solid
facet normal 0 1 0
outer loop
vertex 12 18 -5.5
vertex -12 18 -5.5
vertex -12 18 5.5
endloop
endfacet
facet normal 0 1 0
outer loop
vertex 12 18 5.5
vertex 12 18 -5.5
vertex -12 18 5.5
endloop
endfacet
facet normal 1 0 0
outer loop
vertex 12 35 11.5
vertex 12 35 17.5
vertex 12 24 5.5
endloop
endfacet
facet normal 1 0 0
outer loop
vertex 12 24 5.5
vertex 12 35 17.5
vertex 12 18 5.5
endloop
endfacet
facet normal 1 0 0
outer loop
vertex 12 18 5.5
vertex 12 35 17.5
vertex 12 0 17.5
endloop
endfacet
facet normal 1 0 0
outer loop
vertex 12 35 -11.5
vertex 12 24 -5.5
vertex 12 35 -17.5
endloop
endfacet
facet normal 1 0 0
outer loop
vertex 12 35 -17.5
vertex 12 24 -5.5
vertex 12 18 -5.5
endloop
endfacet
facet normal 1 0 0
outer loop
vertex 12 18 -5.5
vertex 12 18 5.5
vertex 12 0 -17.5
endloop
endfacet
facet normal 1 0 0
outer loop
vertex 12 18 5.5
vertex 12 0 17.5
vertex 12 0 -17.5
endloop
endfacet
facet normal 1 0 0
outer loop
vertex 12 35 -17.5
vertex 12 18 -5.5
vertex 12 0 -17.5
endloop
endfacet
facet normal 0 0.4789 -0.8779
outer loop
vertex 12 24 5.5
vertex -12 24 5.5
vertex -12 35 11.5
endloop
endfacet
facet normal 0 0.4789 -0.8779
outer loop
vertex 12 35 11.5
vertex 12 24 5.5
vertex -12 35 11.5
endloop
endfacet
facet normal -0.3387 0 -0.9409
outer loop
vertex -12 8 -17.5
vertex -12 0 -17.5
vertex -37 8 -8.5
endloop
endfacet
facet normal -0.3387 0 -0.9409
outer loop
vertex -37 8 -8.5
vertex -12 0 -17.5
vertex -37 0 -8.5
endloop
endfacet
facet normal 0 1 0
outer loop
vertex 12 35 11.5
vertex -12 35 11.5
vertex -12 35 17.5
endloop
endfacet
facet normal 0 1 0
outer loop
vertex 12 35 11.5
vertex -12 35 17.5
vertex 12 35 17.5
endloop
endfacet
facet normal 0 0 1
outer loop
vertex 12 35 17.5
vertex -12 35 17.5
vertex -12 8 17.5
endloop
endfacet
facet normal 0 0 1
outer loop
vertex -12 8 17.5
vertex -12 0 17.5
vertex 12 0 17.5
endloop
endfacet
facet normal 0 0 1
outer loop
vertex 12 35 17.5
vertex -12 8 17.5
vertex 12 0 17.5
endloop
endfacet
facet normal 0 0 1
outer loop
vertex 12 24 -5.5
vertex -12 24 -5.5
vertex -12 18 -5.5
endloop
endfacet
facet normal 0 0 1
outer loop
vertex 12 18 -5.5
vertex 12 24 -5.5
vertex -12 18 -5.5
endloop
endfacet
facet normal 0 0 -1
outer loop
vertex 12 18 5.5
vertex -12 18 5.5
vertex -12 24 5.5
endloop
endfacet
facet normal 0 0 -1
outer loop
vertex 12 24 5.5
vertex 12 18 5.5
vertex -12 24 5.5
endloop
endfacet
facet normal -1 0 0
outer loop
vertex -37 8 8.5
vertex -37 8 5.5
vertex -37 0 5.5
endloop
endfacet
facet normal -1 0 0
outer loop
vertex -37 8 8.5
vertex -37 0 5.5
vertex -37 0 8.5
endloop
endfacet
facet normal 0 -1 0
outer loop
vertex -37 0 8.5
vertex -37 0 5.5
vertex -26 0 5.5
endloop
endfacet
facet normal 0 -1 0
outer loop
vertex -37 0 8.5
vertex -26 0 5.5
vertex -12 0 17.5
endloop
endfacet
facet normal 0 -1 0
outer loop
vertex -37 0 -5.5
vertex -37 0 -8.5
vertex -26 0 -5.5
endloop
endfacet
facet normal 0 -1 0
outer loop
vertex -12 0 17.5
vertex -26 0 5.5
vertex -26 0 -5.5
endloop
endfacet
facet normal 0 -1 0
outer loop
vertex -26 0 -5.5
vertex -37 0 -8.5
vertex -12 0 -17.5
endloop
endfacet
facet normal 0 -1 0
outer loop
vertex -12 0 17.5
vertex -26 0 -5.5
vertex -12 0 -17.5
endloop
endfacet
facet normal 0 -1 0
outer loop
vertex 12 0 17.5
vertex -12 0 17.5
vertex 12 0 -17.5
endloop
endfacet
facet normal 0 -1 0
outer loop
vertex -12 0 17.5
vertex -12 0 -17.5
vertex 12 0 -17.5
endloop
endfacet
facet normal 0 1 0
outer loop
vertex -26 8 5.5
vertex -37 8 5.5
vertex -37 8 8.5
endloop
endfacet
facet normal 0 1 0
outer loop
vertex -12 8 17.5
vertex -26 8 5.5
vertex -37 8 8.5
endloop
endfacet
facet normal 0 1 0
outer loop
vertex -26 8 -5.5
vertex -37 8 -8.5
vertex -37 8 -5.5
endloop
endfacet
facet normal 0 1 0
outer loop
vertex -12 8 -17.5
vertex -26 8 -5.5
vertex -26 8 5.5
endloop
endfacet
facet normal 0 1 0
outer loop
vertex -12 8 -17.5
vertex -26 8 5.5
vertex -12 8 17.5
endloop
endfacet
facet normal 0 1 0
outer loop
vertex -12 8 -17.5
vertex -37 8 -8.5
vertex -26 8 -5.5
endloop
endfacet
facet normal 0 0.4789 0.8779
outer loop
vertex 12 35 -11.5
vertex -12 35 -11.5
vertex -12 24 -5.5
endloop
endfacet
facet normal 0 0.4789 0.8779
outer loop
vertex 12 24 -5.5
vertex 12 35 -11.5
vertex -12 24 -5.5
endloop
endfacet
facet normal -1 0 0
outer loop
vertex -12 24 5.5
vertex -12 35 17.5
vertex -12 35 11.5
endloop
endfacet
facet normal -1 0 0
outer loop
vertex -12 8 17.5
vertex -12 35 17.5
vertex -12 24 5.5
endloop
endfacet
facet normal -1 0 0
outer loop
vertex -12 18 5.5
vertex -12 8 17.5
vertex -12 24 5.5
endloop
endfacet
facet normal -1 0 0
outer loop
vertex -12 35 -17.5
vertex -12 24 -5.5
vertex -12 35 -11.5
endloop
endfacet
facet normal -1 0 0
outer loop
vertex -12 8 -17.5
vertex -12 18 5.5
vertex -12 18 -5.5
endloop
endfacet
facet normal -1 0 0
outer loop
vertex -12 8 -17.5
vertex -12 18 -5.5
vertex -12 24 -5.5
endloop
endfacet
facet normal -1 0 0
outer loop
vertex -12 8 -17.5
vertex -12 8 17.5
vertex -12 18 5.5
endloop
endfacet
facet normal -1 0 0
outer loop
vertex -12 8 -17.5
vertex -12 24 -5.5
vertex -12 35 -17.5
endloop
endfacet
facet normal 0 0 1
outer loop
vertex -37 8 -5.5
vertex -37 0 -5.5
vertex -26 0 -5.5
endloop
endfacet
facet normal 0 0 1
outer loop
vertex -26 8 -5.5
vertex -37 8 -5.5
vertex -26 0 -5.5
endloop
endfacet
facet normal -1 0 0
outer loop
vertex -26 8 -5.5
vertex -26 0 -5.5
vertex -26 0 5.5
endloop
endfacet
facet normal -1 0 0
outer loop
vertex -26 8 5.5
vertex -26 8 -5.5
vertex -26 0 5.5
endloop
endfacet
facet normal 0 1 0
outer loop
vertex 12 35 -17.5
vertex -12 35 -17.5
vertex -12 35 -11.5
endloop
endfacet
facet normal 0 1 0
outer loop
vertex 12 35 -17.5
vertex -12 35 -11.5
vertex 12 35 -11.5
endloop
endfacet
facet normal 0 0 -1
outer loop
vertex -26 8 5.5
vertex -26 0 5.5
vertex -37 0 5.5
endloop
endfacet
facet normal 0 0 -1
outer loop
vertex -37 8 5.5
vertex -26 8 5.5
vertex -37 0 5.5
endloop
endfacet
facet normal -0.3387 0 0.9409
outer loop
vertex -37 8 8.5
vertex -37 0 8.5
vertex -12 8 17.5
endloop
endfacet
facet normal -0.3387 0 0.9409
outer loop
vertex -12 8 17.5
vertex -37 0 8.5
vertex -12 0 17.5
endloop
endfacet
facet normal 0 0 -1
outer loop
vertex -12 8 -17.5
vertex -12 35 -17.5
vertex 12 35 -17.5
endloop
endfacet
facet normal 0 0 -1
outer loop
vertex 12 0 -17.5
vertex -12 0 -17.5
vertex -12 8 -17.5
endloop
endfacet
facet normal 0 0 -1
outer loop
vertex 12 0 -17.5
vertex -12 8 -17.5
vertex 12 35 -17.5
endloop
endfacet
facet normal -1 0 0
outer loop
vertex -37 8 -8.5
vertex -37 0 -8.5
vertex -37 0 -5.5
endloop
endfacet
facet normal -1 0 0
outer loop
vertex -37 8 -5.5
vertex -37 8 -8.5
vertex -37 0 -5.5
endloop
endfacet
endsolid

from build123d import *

# Parameters (mm, degrees)
EXTRUDE_2_DEPTH     = 8
SKETCH_5_W          = 24
SKETCH_5_H          = 35
EXTRUDE_3_DEPTH     = 27
CUT_EXTRUDE_1_DEPTH = 27


with BuildPart() as part:
    # 草图4 → 凸台-拉伸2 (new body)
    with BuildSketch(Plane(origin=(0, 0, 0), x_dir=(1, 0, 0), z_dir=(0, 1, 0))):
        Polygon((-12, 17.5), (-37, 8.5), (-37, 5.5), (-26, 5.5), (-26, -5.5), (-37, -5.5), (-37, -8.5), (-12, -17.5), (12, -17.5), (12, 17.5), align=None)
    extrude(amount=EXTRUDE_2_DEPTH)

    # 草图5 → 凸台-拉伸3 (add)
    with BuildSketch(Plane(origin=(0, 8, 0), x_dir=(1, 0, 0), z_dir=(0, 1, 0))):
        Rectangle(SKETCH_5_W, SKETCH_5_H)
    extrude(amount=EXTRUDE_3_DEPTH)

    # 草图6 → 切除-拉伸1 (cut)
    with BuildSketch(Plane.ZY.offset(12)):
        Polygon((-11.5, 35), (-5.5, 24), (-5.5, 18), (5.5, 18), (5.5, 24), (11.5, 35), align=None)
    extrude(amount=-CUT_EXTRUDE_1_DEPTH, mode=Mode.SUBTRACT)


solid = part.part
